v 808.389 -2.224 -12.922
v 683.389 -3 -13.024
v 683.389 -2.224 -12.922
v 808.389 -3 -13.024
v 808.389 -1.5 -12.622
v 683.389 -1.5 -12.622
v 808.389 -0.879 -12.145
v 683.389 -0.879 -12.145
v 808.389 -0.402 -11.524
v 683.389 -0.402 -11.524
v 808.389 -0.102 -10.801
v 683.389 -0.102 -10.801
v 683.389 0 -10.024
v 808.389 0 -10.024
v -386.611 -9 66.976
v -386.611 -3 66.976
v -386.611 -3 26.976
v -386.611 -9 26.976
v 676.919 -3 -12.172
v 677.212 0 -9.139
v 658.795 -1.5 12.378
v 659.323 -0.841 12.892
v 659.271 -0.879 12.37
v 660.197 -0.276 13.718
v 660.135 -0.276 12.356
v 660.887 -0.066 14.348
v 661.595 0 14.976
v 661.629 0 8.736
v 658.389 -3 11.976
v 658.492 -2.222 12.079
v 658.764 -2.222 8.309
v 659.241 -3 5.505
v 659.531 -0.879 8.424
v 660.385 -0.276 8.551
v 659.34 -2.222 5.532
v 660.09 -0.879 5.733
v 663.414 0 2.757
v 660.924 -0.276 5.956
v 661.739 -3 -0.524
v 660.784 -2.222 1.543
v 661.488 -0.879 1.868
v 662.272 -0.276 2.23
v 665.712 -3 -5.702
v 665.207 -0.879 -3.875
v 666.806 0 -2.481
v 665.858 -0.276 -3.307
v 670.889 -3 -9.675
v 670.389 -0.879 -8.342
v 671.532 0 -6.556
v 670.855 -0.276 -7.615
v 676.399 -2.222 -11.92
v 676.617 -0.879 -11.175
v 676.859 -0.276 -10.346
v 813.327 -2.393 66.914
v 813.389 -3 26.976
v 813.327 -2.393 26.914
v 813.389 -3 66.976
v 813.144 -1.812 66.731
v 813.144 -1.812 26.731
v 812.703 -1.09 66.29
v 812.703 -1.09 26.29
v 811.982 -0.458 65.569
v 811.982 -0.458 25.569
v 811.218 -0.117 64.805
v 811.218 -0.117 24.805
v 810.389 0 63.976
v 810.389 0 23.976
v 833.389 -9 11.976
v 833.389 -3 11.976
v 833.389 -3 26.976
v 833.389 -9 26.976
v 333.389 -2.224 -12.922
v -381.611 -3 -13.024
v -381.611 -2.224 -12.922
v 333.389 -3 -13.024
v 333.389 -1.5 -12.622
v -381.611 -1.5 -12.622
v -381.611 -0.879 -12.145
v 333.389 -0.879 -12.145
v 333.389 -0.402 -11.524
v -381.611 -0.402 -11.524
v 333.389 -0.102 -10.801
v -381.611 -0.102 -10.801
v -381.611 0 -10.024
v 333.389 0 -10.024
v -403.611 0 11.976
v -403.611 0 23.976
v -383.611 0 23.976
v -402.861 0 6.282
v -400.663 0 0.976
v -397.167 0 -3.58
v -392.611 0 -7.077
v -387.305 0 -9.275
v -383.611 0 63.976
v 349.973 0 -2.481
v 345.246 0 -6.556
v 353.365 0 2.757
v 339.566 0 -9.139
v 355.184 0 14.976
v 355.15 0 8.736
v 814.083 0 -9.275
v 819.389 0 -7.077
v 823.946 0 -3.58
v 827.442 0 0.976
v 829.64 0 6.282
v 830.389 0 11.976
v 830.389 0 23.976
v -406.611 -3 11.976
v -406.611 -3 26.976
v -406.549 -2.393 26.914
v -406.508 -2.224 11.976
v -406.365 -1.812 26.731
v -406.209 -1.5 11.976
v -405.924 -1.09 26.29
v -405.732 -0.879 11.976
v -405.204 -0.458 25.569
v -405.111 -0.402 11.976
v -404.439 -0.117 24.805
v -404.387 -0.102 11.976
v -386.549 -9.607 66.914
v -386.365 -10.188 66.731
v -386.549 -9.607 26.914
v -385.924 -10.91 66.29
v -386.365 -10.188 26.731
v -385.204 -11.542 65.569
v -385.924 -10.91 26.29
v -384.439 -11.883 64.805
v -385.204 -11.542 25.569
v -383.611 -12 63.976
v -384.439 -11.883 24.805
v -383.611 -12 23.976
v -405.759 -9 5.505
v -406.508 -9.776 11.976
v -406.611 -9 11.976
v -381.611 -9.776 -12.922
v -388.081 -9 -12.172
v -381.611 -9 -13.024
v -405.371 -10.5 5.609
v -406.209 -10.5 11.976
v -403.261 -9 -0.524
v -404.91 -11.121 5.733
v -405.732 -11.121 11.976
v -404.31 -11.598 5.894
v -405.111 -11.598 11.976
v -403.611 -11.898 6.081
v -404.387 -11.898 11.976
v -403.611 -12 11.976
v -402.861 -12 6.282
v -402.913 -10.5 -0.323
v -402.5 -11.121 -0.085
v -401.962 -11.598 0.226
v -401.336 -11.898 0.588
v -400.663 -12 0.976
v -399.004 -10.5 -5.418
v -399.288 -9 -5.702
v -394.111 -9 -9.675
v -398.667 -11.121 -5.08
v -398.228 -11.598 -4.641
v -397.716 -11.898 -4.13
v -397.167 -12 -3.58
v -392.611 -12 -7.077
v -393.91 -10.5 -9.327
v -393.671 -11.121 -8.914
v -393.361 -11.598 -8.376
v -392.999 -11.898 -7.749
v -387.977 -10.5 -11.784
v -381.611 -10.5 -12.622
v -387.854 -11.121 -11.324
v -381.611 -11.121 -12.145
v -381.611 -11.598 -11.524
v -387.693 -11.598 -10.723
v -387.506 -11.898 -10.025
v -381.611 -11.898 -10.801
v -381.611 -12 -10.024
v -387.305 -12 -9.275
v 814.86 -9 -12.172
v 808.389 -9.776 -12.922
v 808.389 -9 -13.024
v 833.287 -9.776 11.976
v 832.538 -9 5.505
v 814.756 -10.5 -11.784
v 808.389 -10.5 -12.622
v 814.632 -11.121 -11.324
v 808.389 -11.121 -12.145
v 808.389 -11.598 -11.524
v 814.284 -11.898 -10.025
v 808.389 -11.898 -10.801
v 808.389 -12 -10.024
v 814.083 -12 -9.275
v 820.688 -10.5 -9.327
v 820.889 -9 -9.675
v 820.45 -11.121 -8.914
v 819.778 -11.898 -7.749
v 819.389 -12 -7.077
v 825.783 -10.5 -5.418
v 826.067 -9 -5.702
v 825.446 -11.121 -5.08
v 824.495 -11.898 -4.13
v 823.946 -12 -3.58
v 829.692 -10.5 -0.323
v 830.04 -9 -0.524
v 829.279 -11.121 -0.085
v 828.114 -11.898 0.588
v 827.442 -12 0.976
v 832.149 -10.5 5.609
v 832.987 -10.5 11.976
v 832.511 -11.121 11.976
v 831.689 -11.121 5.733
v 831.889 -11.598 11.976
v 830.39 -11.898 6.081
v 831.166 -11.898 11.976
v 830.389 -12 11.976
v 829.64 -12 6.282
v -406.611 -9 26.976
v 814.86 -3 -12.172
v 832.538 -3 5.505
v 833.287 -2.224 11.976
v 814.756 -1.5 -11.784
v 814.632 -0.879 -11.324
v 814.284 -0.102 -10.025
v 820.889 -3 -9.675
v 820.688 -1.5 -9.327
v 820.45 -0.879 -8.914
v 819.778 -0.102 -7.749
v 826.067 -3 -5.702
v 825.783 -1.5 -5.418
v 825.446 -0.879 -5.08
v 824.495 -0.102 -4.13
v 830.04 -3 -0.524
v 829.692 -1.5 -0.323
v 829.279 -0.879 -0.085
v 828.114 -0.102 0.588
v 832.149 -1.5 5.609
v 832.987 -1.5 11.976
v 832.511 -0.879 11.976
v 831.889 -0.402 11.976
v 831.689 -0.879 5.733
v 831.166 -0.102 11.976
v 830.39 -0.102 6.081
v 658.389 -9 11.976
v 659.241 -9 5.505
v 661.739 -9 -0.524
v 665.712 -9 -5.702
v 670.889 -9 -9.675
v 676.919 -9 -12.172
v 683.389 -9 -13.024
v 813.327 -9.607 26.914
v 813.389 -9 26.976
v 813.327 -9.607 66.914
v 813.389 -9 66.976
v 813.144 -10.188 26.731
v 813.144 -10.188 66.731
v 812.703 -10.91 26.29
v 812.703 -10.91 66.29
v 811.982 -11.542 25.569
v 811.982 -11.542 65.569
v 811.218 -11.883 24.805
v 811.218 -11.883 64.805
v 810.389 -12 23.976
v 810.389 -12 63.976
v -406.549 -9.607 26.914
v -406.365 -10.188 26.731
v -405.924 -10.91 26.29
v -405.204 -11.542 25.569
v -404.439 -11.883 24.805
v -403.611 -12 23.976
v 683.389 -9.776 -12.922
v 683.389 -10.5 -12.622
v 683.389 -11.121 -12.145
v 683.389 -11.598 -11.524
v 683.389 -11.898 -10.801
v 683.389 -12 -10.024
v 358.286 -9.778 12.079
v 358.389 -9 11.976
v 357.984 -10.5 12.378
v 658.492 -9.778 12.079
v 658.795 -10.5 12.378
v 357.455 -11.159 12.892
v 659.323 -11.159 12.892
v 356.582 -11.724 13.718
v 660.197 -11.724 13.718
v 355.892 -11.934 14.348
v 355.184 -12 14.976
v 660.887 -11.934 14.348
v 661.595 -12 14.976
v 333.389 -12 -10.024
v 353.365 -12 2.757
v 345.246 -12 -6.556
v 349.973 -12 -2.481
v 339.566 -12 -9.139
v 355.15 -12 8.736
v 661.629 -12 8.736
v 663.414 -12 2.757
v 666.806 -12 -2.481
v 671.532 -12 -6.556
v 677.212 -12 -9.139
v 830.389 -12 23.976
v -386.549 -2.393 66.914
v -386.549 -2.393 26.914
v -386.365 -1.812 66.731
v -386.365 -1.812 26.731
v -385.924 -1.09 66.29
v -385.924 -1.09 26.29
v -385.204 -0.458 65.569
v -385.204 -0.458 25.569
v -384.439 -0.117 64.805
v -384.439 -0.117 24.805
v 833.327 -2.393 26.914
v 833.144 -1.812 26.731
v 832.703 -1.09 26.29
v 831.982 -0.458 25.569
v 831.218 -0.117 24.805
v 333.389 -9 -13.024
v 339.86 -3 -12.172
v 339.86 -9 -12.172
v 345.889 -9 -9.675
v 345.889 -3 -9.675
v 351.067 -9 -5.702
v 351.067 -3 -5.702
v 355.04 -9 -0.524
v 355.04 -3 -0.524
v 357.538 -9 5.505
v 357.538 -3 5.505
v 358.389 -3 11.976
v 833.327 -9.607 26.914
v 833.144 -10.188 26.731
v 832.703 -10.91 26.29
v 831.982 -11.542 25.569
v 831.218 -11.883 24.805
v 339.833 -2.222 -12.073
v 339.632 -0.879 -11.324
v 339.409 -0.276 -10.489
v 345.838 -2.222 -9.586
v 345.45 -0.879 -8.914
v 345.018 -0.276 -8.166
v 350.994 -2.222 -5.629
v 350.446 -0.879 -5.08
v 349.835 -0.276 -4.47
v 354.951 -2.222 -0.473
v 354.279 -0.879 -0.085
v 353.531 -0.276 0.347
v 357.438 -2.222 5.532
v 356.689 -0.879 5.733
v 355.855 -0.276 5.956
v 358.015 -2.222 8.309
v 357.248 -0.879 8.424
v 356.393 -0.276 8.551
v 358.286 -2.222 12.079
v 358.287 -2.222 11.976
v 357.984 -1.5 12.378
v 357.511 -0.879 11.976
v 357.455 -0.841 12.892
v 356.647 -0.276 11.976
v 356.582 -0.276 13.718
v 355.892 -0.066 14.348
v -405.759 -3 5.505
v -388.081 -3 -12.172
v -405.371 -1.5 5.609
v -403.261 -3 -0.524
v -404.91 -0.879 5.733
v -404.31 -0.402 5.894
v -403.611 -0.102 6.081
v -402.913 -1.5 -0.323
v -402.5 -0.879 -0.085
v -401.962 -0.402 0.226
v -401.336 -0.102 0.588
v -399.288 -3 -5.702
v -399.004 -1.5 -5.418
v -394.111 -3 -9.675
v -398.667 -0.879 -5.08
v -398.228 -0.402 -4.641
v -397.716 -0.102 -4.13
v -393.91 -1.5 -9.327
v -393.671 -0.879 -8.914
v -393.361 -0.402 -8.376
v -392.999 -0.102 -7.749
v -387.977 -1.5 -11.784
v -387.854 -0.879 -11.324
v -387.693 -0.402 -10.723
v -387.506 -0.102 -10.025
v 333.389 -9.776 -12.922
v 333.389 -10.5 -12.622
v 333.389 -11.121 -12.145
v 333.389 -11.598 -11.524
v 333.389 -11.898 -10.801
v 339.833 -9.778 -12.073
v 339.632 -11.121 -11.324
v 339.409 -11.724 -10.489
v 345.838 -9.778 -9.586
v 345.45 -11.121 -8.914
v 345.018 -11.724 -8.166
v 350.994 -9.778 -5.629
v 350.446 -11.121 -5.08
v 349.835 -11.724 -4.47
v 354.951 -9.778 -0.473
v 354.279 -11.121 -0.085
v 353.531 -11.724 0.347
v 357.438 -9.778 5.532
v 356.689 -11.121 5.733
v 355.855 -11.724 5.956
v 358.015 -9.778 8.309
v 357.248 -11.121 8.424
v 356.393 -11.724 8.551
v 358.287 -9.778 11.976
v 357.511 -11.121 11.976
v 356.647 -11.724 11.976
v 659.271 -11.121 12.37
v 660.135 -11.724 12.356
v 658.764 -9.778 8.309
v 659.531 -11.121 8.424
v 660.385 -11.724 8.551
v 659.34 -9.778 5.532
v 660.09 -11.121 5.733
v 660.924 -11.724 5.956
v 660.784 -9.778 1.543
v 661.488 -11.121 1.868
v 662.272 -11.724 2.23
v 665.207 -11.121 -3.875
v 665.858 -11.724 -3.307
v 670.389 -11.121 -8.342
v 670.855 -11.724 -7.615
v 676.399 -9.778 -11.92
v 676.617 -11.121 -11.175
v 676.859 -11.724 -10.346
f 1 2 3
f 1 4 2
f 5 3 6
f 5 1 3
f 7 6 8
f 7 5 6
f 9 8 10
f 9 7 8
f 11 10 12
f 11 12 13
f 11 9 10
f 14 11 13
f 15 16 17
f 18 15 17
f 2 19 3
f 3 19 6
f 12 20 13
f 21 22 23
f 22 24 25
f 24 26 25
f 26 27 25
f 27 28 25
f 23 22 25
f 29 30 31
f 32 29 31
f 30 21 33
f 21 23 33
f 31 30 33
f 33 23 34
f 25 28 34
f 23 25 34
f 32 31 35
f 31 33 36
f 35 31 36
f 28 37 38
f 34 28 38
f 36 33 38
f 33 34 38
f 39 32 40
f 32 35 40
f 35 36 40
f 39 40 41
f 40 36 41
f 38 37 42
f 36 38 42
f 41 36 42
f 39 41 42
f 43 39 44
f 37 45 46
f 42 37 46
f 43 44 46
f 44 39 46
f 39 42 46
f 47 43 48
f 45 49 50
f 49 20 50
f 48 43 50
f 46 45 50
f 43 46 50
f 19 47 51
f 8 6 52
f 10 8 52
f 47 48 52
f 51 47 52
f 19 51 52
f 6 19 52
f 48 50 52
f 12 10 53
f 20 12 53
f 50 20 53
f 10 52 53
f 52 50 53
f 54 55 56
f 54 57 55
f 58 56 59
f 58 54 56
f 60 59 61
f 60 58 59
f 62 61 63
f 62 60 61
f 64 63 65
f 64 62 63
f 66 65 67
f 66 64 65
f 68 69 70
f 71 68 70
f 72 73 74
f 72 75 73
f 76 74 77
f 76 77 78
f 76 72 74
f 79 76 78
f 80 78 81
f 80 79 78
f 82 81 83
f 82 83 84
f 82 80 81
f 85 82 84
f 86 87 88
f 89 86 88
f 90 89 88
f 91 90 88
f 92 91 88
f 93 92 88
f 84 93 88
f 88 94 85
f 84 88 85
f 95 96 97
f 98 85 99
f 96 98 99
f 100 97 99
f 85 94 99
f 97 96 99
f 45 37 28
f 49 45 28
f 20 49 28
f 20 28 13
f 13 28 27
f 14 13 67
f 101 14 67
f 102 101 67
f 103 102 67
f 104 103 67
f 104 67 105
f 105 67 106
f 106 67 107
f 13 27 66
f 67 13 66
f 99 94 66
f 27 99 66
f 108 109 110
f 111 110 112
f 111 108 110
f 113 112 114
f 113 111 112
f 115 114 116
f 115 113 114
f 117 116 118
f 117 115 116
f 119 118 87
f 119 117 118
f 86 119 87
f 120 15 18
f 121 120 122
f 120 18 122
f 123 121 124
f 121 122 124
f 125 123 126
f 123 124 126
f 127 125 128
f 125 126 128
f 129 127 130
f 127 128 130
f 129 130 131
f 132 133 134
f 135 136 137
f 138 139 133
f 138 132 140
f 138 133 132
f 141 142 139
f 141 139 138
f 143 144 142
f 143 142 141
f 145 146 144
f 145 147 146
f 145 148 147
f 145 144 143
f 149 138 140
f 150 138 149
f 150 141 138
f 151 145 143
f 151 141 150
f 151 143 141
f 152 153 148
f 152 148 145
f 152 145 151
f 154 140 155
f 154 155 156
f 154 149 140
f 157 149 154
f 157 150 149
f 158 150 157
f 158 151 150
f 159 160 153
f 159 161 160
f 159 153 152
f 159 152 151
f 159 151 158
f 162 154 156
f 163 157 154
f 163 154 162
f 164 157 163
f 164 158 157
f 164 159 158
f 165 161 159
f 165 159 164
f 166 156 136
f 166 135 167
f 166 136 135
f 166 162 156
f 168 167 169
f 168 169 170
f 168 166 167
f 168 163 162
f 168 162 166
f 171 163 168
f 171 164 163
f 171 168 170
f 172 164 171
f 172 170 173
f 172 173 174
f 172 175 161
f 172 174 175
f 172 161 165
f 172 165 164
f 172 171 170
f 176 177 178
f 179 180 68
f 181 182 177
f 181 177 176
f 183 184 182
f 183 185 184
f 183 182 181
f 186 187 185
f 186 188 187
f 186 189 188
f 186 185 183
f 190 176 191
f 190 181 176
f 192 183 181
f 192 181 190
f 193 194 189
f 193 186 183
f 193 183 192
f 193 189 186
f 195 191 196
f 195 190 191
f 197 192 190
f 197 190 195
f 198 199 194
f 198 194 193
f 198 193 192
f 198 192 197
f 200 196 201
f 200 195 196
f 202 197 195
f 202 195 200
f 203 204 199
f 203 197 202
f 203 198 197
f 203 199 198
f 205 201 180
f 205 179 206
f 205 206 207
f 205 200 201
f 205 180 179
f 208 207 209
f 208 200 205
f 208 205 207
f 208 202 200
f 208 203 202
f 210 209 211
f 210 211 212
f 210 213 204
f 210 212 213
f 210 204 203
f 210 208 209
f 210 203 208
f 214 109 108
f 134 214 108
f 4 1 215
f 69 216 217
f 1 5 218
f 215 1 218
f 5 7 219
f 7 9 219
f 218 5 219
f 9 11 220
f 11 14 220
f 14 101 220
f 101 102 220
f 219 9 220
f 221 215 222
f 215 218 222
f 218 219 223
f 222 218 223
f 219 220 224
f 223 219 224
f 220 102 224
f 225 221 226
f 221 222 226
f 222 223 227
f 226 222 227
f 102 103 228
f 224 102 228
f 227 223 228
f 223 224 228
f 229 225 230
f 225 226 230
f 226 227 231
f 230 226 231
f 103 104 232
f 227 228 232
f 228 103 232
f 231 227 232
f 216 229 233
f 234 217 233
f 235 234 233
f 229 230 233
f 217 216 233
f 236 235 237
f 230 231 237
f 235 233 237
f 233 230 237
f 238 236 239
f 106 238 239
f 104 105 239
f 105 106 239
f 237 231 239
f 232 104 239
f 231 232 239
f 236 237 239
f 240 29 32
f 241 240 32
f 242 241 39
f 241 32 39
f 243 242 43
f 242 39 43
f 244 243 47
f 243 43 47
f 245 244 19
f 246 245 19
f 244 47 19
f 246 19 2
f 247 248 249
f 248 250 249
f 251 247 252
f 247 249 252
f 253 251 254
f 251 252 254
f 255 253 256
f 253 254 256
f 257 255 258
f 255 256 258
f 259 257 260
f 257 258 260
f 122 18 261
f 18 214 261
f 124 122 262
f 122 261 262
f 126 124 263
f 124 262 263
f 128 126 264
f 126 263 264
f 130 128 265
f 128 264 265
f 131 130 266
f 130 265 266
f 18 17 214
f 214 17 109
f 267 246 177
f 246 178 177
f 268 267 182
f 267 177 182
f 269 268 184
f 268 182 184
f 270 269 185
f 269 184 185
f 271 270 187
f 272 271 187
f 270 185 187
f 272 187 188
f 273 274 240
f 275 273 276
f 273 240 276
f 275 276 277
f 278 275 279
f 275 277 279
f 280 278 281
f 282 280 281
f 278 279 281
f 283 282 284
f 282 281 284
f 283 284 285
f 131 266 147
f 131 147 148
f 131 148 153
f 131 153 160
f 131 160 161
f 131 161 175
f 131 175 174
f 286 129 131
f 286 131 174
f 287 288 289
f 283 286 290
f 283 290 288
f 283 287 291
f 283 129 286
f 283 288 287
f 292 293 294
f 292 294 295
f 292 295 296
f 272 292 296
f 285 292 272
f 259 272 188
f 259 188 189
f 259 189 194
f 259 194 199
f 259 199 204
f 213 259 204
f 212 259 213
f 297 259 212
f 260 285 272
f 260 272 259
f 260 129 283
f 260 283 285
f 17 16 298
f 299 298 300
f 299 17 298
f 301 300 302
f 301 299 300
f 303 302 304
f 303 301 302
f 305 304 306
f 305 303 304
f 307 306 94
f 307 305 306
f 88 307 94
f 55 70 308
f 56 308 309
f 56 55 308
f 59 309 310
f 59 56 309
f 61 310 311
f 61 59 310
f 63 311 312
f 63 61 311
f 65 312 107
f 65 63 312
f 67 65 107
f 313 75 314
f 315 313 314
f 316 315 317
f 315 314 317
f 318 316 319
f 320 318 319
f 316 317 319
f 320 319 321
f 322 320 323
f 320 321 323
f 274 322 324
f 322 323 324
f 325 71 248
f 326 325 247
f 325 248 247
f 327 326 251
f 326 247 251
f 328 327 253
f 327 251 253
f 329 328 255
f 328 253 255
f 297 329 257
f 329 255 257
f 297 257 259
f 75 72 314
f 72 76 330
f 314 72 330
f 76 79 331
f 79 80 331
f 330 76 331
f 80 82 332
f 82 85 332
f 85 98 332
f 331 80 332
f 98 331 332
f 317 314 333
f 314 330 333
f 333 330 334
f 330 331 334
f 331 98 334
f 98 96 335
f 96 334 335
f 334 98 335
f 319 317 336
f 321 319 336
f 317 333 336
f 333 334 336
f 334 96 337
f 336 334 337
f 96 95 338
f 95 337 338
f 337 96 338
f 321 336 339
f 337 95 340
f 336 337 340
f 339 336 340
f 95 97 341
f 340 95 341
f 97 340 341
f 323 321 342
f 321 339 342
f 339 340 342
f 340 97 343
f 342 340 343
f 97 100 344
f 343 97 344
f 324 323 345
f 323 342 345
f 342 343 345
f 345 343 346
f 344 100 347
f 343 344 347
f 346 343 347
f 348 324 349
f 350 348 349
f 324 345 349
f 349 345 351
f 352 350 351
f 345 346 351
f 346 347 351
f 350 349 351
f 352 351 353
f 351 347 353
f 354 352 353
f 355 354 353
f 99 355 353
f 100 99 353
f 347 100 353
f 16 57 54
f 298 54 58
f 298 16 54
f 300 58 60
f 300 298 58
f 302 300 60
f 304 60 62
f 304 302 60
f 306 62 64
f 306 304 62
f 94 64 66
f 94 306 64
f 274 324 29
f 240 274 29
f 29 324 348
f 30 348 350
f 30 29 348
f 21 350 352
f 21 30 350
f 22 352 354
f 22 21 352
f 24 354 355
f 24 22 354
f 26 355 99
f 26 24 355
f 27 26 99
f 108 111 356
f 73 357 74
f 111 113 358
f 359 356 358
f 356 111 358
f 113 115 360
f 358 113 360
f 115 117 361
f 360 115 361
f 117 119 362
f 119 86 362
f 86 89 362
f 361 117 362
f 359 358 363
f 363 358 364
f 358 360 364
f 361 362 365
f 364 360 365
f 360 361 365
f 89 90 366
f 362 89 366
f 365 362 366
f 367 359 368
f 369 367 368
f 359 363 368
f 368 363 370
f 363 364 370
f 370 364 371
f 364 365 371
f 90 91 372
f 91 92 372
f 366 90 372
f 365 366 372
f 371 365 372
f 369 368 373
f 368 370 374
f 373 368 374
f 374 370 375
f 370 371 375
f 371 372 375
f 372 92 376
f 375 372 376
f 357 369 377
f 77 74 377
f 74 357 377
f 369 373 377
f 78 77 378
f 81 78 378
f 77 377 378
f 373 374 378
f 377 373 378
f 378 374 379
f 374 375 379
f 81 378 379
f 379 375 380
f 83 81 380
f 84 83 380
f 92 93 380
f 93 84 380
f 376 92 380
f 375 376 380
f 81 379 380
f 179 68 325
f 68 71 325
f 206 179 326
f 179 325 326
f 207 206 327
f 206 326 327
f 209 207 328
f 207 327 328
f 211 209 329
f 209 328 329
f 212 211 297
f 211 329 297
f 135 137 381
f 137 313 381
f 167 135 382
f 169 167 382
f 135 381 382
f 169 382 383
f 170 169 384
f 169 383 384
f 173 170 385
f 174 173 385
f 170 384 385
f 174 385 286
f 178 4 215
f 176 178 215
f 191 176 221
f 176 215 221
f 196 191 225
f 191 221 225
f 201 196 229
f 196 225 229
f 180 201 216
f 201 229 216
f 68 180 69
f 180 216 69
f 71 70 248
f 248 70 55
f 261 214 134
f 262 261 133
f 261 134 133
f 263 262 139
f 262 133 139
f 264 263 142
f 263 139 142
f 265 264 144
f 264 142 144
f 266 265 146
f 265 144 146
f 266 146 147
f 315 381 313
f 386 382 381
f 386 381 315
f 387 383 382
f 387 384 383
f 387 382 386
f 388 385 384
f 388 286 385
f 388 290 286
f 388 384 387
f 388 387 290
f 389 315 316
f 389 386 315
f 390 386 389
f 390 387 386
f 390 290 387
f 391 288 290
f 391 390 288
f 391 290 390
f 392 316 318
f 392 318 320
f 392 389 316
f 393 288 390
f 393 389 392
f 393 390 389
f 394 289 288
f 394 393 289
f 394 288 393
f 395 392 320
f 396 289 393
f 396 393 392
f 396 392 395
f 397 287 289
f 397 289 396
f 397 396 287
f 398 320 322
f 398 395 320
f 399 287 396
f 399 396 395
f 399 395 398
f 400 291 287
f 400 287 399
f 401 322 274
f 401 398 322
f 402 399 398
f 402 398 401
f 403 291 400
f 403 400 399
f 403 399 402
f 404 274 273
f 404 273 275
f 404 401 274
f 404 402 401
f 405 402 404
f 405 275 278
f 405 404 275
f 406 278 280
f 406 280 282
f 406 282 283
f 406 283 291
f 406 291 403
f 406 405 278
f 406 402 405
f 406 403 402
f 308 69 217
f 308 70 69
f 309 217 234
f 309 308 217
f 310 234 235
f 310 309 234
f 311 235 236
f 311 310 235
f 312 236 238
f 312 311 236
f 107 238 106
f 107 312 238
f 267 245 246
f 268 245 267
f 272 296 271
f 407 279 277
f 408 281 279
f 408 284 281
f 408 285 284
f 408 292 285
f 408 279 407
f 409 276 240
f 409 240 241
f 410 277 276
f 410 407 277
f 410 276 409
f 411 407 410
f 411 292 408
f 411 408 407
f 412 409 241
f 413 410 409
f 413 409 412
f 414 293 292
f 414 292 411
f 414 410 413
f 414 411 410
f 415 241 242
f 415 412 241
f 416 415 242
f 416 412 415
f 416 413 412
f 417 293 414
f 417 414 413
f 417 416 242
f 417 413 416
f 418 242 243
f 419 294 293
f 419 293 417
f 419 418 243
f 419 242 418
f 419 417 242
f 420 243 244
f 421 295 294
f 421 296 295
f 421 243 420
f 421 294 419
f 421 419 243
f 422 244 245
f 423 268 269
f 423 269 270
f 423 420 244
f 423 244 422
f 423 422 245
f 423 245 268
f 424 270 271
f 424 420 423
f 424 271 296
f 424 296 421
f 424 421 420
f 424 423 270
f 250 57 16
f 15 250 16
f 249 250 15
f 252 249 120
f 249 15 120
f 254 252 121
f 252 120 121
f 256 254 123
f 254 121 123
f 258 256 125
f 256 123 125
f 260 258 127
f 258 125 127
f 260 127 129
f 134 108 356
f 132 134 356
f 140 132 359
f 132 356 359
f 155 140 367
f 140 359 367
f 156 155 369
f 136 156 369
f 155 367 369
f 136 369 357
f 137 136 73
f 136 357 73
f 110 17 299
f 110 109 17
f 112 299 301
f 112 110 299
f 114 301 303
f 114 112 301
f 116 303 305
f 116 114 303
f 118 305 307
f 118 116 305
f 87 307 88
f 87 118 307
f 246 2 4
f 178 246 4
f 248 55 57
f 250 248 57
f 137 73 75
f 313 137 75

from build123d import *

# Parameters (mm, degrees)
F1_DEPTH = 12
F3_R     = 3


with BuildPart() as f1:
    # F0 (on Front) → F1 (new body)
    with BuildSketch(Plane.XZ):
        with BuildLine():
            Line((813.389391, 66.97586), (-386.610609, 66.97586))
            Line((-386.610609, 66.97586), (-386.610609, 26.97586))
            Line((-386.610609, 26.97586), (-406.610609, 26.97586))
            Line((-406.610609, 26.97586), (-406.610609, 11.97586))
            ThreePointArc((-406.610609, 11.97586), (-399.288279, -5.70181), (-381.610609, -13.02414))
            Line((-381.610609, -13.02414), (333.389391, -13.02414))
            ThreePointArc((333.389391, -13.02414), (351.06706, -5.70181), (358.389391, 11.97586))
            Line((358.389391, 11.97586), (658.389391, 11.97586))
            ThreePointArc((658.389391, 11.97586), (665.711721, -5.70181), (683.389391, -13.02414))
            Line((683.389391, -13.02414), (808.389391, -13.02414))
            ThreePointArc((808.389391, -13.02414), (826.06706, -5.70181), (833.389391, 11.97586))
            Line((833.389391, 11.97586), (833.389391, 26.97586))
            Line((833.389391, 26.97586), (813.389391, 26.97586))
            Line((813.389391, 26.97586), (813.389391, 66.97586))
        make_face()
    extrude(amount=F1_DEPTH)

    # F3
    f3_edges = [f1.edges().sort_by_distance(p)[0] for p in [
        (213.389391, -12, 66.97586),
        (-386.610609, -12, 46.97586),
        (-396.610609, -12, 26.97586),
        (-406.610609, -12, 19.47586),
        (-399.288279, -12, -5.70181),
        (-24.110609, -12, -13.02414),
        (351.06706, -12, -5.70181),
        (508.389391, -12, 11.97586),
        (665.711721, -12, -5.70181),
        (745.889391, -12, -13.02414),
        (826.06706, -12, -5.70181),
        (833.389391, -12, 19.47586),
        (823.389391, -12, 26.97586),
        (813.389391, -12, 46.97586),
        (213.389391, 0, 66.97586),
        (-386.610609, 0, 46.97586),
        (-396.610609, 0, 26.97586),
        (-406.610609, 0, 19.47586),
        (-399.288279, 0, -5.70181),
        (-24.110609, 0, -13.02414),
        (351.06706, 0, -5.70181),
        (508.389391, 0, 11.97586),
        (665.711721, 0, -5.70181),
        (745.889391, 0, -13.02414),
        (826.06706, 0, -5.70181),
        (833.389391, 0, 19.47586),
        (823.389391, 0, 26.97586),
        (813.389391, 0, 46.97586),
    ]]
    fillet(f3_edges, radius=F3_R)


solid = f1.part
